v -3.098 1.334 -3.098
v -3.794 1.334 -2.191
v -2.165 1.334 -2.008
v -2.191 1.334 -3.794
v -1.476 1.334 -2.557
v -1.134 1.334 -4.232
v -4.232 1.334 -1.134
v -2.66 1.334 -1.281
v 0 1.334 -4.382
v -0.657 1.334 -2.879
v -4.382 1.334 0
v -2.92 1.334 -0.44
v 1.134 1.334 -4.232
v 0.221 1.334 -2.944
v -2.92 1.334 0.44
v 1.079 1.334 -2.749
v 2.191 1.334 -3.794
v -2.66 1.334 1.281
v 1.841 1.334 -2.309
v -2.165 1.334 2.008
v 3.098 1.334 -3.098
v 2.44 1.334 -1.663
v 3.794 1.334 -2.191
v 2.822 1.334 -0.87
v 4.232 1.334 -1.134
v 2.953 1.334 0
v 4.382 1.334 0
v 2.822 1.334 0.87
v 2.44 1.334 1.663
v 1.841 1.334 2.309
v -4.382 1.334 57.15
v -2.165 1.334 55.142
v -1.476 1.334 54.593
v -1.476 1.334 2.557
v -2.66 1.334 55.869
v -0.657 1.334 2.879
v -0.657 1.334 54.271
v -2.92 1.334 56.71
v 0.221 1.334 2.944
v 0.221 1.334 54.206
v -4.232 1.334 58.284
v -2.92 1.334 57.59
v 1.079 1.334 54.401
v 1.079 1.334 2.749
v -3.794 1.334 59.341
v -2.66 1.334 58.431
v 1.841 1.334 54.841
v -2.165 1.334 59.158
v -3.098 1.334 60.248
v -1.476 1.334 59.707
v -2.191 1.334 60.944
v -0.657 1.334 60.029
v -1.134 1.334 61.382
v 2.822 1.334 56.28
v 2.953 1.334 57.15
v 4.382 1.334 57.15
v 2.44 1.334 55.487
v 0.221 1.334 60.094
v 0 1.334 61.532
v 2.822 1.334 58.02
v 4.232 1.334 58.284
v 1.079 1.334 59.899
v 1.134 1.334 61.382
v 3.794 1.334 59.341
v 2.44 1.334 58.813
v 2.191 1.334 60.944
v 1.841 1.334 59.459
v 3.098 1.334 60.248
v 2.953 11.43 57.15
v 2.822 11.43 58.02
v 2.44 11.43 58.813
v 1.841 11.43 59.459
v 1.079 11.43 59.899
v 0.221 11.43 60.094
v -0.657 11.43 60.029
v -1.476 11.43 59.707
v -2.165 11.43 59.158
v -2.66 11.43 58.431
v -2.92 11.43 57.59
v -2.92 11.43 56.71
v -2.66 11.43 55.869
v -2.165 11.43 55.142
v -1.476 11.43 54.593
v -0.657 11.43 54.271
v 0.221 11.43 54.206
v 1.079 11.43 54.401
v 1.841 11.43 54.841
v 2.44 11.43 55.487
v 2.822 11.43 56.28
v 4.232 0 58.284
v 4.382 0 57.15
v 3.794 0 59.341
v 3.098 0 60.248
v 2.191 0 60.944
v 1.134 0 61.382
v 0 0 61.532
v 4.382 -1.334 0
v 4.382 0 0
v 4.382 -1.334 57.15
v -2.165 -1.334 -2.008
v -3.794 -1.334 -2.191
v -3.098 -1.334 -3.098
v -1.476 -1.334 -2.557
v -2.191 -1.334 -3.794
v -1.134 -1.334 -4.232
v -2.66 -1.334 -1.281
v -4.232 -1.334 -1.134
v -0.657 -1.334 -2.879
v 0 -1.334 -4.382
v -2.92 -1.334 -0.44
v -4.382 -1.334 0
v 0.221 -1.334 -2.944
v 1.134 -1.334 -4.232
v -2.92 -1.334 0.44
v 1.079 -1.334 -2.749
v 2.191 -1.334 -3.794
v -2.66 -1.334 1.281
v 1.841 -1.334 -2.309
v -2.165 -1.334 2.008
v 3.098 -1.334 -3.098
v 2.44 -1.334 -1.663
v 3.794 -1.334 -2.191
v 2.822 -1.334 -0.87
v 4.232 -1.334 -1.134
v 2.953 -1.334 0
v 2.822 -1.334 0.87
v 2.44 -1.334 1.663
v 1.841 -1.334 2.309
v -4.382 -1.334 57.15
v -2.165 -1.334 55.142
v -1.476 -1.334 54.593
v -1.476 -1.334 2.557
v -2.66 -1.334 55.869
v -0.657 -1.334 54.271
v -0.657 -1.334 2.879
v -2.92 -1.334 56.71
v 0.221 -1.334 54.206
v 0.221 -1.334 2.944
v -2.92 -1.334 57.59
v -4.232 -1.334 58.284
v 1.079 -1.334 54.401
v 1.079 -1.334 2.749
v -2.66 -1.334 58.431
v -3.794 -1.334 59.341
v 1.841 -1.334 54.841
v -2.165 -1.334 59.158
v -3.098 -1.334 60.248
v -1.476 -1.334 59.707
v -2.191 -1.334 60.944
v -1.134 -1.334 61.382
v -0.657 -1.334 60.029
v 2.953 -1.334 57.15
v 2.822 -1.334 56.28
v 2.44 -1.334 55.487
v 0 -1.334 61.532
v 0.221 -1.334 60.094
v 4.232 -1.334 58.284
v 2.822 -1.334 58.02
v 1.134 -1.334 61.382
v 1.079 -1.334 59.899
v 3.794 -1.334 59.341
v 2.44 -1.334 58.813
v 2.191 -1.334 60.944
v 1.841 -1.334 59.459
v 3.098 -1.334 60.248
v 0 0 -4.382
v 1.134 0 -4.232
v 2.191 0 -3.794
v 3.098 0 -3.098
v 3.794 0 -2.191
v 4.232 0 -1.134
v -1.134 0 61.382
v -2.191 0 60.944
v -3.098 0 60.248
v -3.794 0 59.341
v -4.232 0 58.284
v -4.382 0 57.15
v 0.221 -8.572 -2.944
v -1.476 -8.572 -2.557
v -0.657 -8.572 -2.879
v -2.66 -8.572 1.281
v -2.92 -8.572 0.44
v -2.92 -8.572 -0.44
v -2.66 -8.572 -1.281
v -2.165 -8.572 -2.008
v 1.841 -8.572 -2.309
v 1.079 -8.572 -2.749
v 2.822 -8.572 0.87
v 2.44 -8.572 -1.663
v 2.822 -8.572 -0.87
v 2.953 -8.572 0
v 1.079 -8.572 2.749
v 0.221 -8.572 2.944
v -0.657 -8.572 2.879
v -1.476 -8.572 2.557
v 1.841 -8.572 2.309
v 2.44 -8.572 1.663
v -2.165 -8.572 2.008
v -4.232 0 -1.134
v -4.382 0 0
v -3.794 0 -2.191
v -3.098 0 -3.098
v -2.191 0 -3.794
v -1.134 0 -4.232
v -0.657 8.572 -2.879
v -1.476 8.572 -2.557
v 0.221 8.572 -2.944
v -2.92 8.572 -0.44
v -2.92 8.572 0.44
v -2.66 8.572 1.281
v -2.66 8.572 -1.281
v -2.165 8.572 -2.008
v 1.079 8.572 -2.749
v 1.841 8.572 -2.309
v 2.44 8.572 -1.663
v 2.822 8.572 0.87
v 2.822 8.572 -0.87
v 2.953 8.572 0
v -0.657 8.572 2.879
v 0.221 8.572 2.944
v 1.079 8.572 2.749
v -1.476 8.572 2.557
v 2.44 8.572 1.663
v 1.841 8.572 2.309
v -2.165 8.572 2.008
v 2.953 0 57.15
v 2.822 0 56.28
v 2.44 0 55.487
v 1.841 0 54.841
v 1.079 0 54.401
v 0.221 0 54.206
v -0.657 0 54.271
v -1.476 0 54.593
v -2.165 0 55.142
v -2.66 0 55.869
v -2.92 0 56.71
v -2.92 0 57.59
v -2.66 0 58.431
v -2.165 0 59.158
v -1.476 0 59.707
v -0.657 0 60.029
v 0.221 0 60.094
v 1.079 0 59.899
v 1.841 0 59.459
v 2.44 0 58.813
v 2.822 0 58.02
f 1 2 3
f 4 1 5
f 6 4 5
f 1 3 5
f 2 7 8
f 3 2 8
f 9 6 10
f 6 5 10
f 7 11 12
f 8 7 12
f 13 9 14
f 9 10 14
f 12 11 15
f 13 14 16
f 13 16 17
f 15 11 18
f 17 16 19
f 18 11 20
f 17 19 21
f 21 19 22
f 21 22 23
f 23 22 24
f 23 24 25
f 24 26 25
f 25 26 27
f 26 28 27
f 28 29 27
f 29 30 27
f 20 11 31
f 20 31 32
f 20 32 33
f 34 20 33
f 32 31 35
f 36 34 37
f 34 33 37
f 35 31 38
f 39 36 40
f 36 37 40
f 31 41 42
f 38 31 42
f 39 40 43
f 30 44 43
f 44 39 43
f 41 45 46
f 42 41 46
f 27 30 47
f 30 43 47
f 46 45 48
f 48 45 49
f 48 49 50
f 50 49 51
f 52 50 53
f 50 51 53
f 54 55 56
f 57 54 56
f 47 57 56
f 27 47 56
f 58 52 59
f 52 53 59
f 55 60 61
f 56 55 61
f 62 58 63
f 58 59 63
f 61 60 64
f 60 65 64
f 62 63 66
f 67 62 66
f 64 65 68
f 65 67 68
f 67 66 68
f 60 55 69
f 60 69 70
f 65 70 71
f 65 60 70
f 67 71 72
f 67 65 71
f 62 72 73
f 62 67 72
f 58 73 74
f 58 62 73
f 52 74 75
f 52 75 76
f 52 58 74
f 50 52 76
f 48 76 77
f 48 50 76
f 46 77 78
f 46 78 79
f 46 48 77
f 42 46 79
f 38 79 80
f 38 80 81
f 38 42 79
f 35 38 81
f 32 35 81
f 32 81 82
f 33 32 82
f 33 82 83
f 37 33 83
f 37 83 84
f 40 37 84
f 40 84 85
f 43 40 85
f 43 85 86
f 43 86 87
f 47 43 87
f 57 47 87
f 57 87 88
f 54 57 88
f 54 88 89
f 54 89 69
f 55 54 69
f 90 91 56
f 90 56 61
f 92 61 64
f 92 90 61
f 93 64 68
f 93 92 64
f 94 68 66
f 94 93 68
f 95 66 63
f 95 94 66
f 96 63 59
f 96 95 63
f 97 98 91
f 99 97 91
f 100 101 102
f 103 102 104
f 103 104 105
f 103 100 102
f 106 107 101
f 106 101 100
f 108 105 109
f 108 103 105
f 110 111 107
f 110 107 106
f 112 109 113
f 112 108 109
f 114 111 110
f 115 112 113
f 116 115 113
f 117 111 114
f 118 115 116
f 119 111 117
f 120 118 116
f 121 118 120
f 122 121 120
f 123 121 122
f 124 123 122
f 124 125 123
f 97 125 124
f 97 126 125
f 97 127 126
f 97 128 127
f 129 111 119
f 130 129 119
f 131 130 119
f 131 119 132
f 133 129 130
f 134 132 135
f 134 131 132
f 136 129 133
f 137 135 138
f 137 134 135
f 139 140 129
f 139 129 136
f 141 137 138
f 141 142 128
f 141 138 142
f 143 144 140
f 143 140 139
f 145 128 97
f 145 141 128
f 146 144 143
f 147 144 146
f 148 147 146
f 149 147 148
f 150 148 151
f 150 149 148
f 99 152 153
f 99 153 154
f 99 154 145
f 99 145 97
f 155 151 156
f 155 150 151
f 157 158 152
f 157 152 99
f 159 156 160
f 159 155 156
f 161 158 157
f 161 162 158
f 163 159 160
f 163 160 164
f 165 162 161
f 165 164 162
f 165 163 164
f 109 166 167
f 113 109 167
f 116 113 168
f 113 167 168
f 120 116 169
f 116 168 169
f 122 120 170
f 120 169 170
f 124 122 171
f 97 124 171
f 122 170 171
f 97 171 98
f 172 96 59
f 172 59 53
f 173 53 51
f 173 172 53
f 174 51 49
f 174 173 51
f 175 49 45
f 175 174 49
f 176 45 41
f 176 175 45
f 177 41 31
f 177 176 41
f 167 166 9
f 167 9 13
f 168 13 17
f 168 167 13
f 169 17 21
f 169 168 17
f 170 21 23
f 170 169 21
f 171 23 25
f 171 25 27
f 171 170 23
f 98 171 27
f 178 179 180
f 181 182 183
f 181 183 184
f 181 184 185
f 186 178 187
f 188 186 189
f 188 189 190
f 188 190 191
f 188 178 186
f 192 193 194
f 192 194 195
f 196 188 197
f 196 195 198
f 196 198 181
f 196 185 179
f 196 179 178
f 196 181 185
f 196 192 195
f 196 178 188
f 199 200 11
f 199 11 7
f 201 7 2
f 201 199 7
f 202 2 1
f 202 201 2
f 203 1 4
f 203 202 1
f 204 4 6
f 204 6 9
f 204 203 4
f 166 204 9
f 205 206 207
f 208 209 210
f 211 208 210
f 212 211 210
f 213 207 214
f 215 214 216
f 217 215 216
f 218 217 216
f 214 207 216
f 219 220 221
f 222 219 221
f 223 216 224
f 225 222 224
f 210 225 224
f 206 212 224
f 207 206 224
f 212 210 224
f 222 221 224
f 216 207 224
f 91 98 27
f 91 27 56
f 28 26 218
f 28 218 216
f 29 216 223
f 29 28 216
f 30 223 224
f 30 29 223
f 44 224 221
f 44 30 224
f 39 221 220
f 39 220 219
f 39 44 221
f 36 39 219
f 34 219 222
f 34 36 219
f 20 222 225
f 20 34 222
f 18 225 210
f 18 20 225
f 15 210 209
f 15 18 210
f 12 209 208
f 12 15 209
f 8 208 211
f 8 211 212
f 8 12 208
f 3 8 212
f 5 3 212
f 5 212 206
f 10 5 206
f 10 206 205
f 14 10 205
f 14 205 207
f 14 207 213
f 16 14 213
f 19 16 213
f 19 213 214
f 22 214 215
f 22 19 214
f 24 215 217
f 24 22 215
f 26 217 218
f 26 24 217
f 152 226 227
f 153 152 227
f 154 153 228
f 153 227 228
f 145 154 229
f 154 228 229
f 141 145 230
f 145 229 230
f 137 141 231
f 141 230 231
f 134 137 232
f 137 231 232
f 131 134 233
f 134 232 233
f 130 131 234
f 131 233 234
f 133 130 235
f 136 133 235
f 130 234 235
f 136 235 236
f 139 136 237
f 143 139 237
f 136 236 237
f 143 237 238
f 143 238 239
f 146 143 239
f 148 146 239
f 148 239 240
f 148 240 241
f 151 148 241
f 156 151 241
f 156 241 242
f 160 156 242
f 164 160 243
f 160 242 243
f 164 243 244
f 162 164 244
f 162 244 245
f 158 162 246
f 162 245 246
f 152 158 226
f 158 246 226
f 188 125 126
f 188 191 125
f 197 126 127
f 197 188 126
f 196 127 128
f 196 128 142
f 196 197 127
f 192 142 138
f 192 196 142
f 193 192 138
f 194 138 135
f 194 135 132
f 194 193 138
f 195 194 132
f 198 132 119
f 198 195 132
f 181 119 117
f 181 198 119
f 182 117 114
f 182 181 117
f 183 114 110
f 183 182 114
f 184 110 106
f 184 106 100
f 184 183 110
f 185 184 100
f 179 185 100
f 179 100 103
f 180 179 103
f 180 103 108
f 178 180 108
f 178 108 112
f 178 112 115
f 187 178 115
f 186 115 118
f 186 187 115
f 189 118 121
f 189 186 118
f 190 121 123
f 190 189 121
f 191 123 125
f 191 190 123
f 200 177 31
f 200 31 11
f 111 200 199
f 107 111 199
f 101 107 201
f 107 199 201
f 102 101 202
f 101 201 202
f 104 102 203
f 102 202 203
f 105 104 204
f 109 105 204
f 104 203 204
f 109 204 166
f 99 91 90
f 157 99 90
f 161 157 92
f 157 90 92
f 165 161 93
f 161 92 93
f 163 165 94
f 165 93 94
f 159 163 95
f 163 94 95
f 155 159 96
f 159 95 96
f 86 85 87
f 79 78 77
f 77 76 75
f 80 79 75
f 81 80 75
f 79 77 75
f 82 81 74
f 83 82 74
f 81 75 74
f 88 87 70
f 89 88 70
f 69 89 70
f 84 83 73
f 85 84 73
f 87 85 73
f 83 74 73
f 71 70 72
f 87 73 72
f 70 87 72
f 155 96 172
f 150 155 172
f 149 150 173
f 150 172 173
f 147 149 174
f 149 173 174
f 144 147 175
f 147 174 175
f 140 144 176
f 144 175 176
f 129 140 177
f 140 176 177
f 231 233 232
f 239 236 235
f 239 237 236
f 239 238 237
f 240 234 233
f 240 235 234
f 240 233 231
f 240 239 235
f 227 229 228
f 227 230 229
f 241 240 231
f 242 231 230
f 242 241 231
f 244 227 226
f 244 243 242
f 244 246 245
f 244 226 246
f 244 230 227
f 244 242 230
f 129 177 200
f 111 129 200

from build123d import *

# Parameters (mm, degrees)
F0_R     = 0.3937
F1_DEPTH = 0.1778
F2_DEPTH = 1.143
F3_DEPTH = 1.524
F4_SCALE = 7.5


with BuildPart() as f1:
    # F0 (on Front) → F1 (new body, symmetric)
    with BuildSketch(Plane.XZ):
        with BuildLine():
            ThreePointArc((0, 8.2042), (-0.4130917816, 8.0330917816), (-0.5842, 7.62))
            Line((-0.5842, 7.62), (-0.5842, 0))
            ThreePointArc((-0.5842, 0), (-0.4130917816, -0.4130917816), (0, -0.5842))
            ThreePointArc((0, -0.5842), (0.4130917816, -0.4130917816), (0.5842, 0))
            Line((0.5842, 0), (0.5842, 7.62))
            ThreePointArc((0.5842, 7.62), (0.4130917816, 8.0330917816), (0, 8.2042))
        make_face()
        Circle(F0_R, mode=Mode.SUBTRACT)
        with BuildLine():
            ThreePointArc((-0.3937, 7.62), (0, 8.0137), (0.3937, 7.62))
            ThreePointArc((0.3937, 7.62), (0, 7.2263), (-0.3937, 7.62))
        make_face(mode=Mode.SUBTRACT)
    extrude(amount=F1_DEPTH, both=True)

    # F0 (on Front) → F2 (join, symmetric)
    with BuildSketch(Plane.XZ):
        Circle(F0_R)
    extrude(amount=F2_DEPTH, both=True)

    # F0 (on Front) → F3 (join)
    with BuildSketch(Plane.XZ):
        with BuildLine():
            ThreePointArc((-0.3937, 7.62), (0, 7.2263), (0.3937, 7.62))
            ThreePointArc((0.3937, 7.62), (0, 8.0137), (-0.3937, 7.62))
        make_face()
    extrude(amount=-F3_DEPTH)


with BuildPart() as f1_1:
    # F4: moved
    add(f1.part.scale(F4_SCALE))


solid = f1_1.part
